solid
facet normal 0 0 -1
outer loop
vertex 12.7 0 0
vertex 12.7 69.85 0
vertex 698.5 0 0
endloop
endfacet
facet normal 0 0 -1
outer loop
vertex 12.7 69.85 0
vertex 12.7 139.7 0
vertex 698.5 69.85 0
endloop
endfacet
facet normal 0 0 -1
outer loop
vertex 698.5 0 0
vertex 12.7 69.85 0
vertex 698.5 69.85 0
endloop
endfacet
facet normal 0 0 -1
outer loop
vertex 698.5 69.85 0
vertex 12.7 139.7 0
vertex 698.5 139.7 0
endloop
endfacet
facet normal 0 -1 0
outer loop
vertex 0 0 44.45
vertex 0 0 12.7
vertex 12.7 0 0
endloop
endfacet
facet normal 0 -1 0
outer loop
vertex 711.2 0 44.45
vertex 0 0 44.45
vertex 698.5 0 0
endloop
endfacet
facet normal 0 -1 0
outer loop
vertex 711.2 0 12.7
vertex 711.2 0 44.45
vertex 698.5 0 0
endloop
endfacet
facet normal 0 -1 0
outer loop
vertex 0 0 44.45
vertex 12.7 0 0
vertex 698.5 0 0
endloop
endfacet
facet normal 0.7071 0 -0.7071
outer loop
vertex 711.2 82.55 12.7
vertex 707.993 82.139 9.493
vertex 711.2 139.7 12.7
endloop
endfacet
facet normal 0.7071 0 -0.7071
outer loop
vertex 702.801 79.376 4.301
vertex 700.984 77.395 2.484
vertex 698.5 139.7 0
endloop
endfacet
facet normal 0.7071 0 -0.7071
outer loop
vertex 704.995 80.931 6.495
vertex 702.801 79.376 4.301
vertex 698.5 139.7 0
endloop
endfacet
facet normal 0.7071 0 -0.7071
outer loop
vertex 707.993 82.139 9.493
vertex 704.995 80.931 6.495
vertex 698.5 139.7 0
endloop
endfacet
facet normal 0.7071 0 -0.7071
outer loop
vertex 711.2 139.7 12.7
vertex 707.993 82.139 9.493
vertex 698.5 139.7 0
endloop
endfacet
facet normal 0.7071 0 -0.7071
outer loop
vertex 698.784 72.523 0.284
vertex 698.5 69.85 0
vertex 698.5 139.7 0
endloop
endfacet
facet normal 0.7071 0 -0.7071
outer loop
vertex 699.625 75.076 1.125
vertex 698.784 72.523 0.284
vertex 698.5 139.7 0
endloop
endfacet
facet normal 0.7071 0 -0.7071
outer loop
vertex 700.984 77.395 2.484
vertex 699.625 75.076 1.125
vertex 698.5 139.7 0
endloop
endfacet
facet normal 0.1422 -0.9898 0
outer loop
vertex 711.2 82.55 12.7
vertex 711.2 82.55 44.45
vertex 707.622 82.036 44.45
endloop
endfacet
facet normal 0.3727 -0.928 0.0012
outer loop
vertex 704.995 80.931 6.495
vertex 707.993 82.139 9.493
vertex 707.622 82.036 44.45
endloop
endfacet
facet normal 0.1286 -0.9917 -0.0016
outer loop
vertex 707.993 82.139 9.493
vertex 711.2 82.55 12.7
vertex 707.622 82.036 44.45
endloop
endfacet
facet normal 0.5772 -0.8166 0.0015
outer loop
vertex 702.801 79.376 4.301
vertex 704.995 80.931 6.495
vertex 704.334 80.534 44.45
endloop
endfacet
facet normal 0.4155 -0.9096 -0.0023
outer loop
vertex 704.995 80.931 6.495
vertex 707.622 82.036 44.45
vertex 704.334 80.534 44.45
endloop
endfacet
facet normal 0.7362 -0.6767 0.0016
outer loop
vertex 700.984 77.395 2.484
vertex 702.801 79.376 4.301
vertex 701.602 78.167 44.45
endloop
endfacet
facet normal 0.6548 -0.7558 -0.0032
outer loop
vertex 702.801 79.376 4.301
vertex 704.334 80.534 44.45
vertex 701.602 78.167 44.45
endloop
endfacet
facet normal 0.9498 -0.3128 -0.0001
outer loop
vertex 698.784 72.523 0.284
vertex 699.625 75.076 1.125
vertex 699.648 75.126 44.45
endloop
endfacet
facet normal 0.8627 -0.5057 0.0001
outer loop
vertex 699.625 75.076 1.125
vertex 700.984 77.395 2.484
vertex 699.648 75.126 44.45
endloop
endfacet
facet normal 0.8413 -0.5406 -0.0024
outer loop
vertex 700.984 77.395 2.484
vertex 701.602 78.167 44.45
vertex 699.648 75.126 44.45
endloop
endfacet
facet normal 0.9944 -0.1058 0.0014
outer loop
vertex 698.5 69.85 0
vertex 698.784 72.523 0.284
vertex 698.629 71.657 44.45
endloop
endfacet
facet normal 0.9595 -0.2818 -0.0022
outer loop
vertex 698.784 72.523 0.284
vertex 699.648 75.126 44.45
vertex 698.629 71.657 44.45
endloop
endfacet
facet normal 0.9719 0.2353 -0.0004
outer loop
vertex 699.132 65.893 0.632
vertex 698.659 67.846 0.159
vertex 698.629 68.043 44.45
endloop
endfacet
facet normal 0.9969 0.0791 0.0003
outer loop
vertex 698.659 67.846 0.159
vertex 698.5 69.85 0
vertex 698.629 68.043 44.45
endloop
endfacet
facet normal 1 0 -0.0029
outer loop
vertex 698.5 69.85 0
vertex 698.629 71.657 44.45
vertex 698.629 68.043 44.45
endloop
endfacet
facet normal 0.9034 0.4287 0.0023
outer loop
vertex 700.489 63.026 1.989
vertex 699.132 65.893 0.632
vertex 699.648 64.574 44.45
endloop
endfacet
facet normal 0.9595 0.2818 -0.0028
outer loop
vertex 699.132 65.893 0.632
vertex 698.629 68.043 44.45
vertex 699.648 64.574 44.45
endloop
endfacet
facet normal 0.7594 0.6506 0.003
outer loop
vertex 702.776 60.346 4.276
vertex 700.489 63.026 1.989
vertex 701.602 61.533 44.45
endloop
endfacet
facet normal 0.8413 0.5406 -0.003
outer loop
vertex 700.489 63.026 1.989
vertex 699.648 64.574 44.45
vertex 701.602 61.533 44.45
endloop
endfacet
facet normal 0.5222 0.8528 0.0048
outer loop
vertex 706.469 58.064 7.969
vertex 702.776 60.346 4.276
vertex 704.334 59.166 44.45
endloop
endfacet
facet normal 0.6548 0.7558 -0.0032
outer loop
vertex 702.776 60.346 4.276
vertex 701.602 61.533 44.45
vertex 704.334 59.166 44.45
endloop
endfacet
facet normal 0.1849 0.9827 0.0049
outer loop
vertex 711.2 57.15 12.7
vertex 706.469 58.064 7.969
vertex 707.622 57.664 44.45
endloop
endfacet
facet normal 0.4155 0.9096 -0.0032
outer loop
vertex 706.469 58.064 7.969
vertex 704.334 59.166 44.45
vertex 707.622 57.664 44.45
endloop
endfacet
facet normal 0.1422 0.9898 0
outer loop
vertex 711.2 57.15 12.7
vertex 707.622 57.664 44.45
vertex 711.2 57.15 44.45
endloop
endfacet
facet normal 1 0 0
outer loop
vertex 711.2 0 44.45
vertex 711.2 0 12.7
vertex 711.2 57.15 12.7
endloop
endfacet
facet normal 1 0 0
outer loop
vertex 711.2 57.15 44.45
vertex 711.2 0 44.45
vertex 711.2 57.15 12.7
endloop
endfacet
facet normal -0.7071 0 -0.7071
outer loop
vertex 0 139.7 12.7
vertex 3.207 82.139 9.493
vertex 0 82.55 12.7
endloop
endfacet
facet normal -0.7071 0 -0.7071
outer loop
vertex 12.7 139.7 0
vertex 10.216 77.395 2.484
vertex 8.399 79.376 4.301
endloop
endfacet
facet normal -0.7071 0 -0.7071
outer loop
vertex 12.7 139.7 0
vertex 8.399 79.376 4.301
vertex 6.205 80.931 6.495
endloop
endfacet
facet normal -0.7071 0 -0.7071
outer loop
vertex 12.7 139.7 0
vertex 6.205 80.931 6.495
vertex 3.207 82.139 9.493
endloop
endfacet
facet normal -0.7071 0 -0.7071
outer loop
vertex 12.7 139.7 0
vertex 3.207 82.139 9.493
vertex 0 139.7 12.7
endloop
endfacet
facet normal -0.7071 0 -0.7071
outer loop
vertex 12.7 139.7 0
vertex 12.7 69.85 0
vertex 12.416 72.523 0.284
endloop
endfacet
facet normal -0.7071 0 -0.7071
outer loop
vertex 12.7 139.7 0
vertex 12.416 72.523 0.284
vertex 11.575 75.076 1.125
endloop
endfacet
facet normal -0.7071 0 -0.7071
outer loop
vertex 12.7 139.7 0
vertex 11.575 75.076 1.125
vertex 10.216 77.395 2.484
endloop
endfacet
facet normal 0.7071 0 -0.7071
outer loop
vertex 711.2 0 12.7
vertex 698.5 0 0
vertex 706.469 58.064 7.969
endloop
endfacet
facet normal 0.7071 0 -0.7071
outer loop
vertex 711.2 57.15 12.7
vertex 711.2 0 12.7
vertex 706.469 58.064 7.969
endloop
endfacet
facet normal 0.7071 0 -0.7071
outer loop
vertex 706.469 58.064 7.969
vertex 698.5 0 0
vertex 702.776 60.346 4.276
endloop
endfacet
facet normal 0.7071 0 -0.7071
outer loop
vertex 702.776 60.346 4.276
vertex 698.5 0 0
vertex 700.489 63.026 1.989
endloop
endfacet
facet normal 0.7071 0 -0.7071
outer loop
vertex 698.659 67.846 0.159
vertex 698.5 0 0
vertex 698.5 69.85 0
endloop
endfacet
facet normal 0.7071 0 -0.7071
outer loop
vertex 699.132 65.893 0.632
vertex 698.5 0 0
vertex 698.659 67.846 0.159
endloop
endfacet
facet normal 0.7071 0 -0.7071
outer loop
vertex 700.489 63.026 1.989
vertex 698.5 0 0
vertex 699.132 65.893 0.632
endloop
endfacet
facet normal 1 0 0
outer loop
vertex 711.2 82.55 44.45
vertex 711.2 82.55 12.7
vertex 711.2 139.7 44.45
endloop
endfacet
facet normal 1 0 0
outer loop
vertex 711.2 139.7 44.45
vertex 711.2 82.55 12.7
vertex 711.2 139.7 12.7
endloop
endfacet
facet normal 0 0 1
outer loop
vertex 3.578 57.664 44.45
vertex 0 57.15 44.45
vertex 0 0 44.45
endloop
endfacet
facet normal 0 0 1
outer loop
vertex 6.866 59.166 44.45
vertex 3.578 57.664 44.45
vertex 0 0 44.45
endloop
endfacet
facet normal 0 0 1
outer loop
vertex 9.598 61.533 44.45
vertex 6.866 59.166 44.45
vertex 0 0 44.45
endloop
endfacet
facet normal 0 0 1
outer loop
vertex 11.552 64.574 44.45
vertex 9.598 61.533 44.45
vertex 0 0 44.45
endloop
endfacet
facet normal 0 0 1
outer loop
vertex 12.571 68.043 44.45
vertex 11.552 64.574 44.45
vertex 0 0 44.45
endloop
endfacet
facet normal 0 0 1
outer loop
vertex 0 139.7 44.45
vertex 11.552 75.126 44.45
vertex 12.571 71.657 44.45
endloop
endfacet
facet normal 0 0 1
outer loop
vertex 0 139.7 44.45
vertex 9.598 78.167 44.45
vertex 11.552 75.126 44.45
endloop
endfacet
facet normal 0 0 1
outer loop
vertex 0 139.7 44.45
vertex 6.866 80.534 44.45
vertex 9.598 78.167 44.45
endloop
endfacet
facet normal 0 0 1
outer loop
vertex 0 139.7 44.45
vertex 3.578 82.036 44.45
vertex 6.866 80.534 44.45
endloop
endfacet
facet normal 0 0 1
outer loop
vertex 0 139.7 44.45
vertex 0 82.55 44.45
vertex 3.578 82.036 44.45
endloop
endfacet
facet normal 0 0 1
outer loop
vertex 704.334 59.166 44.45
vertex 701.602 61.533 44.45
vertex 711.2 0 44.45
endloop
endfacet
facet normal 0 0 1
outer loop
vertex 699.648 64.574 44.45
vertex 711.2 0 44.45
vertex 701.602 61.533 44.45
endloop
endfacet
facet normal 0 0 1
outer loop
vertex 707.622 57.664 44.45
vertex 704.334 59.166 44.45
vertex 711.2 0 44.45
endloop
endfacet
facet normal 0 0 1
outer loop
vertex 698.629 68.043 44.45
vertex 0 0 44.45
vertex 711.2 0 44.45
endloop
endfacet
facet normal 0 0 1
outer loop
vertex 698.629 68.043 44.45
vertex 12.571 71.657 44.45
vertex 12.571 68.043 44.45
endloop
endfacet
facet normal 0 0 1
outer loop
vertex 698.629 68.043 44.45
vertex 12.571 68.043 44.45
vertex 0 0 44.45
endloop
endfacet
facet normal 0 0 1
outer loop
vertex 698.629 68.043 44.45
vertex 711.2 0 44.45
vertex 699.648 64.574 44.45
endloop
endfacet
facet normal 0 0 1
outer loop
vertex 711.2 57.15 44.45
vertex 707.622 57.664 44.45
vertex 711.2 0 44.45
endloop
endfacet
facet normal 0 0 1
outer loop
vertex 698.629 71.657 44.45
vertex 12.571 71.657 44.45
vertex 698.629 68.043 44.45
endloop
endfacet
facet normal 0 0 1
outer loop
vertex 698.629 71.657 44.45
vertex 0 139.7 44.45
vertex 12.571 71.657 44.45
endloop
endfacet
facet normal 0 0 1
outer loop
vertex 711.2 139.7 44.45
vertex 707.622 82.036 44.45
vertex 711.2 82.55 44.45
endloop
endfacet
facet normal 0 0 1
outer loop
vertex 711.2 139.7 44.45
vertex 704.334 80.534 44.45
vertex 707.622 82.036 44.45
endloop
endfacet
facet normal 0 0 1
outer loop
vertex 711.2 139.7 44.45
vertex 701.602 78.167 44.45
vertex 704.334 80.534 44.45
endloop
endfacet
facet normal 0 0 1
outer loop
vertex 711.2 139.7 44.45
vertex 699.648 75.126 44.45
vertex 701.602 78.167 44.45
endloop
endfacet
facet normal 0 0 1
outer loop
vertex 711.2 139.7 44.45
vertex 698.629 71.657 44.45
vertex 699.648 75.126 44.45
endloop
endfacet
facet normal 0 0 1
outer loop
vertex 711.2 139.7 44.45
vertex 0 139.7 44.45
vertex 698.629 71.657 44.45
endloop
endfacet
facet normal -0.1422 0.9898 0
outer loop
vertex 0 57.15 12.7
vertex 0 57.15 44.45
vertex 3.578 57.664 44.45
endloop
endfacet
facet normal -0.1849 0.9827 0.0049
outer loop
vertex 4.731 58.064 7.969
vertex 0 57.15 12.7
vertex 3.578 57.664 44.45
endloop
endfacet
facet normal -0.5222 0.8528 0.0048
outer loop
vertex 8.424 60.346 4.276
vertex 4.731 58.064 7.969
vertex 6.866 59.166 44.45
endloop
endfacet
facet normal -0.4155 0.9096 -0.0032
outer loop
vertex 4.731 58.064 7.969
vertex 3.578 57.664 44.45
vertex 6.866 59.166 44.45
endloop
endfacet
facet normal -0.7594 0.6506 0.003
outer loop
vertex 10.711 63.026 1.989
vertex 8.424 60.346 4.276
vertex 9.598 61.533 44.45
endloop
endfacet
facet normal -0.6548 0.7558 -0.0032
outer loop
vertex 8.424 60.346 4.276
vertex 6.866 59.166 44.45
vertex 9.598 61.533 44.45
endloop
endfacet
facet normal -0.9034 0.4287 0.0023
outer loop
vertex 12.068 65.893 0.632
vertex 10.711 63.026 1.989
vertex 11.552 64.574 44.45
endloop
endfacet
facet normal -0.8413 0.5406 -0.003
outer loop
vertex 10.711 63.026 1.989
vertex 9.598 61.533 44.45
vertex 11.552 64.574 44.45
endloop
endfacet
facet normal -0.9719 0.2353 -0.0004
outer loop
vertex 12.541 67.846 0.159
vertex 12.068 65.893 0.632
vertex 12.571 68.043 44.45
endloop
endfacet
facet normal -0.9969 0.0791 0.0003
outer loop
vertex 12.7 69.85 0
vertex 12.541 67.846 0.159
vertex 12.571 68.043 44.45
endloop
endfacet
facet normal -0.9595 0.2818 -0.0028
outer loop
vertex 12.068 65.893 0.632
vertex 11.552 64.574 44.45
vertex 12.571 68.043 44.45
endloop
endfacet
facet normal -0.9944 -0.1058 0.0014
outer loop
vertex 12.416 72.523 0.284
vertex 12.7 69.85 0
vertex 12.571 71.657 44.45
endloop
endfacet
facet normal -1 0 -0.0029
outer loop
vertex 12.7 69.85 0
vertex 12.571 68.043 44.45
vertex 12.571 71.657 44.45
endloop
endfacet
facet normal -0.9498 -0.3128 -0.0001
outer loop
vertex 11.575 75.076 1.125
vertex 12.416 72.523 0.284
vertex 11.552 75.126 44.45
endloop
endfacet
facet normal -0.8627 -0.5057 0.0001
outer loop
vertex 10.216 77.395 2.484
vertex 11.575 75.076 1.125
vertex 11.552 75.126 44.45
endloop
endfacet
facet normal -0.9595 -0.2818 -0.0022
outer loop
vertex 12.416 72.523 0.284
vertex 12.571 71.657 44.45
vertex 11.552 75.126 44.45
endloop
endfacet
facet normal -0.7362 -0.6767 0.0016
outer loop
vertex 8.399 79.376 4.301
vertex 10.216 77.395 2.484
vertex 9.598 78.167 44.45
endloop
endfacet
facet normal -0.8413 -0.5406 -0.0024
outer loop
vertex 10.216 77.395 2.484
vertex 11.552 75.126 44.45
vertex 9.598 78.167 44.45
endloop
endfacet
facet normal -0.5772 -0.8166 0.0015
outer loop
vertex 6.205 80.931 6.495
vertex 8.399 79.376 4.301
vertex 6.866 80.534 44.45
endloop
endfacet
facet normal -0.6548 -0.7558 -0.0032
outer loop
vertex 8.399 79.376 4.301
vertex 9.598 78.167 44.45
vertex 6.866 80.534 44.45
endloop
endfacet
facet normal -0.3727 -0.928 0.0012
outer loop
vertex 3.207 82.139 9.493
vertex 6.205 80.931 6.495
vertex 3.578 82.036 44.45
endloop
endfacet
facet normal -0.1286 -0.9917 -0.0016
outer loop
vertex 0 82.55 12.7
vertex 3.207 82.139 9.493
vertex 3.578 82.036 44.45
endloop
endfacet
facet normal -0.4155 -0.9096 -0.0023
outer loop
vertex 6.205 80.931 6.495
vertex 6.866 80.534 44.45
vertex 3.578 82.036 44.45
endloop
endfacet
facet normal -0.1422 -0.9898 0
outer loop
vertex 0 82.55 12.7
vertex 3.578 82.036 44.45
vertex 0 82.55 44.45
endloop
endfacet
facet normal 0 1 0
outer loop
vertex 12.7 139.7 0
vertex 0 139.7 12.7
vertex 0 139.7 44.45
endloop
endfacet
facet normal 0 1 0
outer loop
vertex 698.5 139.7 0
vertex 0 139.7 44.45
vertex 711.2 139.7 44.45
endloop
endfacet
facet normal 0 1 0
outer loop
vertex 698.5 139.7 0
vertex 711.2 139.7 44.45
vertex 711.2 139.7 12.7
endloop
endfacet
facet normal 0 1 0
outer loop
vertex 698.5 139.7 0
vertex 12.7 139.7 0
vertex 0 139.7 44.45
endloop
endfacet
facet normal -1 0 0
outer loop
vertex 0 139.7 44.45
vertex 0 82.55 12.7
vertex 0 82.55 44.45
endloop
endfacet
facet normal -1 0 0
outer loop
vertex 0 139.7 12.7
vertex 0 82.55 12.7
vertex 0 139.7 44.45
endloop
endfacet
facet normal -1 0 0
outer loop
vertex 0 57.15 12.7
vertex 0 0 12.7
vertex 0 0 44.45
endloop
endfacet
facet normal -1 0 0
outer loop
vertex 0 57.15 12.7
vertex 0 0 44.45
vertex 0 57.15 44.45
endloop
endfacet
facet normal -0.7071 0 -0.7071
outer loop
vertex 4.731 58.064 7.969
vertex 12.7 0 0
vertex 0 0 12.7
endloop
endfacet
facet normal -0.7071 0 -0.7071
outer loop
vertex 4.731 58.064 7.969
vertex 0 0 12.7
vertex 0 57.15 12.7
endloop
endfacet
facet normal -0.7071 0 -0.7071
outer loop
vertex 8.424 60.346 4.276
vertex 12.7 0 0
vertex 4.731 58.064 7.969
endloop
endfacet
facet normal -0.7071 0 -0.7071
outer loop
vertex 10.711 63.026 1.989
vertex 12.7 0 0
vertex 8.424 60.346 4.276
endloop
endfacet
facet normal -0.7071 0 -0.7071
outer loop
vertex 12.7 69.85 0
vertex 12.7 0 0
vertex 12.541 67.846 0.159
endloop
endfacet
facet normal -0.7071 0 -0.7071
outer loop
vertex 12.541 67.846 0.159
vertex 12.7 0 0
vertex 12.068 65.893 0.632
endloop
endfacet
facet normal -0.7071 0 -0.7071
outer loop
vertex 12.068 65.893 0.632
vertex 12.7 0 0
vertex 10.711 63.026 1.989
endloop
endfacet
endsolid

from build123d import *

# Parameters (mm, degrees)
F0_W     = 711.2
F0_H     = 139.7
F1_DEPTH = 44.45
F2_SIZE  = 12.7
F4_DEPTH = 44.45


with BuildPart() as f1:
    # F0 (on Top) → F1 (new body)
    with BuildSketch(Plane.XY):
        with Locations((355.6, 69.85)):
            Rectangle(F0_W, F0_H)
    extrude(amount=F1_DEPTH)

    # F2
    f2_edges = [f1.edges().sort_by_distance(p)[0] for p in [
        (0, 69.85, 0),
        (711.2, 69.85, 0),
    ]]
    chamfer(f2_edges, length=F2_SIZE)

    # F3 (on face) → F4 (cut)
    with BuildSketch(Plane.XY.offset(44.45)):
        with BuildLine():
            Line((0, 82.55), (0, 57.15))
            ThreePointArc((0, 57.15), (12.7, 69.85), (0, 82.55))
        make_face()
        with BuildLine():
            ThreePointArc((711.2, 82.55), (698.5, 69.85), (711.2, 57.15))
            Line((711.2, 57.15), (711.2, 82.55))
        make_face()
    extrude(amount=-F4_DEPTH, mode=Mode.SUBTRACT)


solid = f1.part
